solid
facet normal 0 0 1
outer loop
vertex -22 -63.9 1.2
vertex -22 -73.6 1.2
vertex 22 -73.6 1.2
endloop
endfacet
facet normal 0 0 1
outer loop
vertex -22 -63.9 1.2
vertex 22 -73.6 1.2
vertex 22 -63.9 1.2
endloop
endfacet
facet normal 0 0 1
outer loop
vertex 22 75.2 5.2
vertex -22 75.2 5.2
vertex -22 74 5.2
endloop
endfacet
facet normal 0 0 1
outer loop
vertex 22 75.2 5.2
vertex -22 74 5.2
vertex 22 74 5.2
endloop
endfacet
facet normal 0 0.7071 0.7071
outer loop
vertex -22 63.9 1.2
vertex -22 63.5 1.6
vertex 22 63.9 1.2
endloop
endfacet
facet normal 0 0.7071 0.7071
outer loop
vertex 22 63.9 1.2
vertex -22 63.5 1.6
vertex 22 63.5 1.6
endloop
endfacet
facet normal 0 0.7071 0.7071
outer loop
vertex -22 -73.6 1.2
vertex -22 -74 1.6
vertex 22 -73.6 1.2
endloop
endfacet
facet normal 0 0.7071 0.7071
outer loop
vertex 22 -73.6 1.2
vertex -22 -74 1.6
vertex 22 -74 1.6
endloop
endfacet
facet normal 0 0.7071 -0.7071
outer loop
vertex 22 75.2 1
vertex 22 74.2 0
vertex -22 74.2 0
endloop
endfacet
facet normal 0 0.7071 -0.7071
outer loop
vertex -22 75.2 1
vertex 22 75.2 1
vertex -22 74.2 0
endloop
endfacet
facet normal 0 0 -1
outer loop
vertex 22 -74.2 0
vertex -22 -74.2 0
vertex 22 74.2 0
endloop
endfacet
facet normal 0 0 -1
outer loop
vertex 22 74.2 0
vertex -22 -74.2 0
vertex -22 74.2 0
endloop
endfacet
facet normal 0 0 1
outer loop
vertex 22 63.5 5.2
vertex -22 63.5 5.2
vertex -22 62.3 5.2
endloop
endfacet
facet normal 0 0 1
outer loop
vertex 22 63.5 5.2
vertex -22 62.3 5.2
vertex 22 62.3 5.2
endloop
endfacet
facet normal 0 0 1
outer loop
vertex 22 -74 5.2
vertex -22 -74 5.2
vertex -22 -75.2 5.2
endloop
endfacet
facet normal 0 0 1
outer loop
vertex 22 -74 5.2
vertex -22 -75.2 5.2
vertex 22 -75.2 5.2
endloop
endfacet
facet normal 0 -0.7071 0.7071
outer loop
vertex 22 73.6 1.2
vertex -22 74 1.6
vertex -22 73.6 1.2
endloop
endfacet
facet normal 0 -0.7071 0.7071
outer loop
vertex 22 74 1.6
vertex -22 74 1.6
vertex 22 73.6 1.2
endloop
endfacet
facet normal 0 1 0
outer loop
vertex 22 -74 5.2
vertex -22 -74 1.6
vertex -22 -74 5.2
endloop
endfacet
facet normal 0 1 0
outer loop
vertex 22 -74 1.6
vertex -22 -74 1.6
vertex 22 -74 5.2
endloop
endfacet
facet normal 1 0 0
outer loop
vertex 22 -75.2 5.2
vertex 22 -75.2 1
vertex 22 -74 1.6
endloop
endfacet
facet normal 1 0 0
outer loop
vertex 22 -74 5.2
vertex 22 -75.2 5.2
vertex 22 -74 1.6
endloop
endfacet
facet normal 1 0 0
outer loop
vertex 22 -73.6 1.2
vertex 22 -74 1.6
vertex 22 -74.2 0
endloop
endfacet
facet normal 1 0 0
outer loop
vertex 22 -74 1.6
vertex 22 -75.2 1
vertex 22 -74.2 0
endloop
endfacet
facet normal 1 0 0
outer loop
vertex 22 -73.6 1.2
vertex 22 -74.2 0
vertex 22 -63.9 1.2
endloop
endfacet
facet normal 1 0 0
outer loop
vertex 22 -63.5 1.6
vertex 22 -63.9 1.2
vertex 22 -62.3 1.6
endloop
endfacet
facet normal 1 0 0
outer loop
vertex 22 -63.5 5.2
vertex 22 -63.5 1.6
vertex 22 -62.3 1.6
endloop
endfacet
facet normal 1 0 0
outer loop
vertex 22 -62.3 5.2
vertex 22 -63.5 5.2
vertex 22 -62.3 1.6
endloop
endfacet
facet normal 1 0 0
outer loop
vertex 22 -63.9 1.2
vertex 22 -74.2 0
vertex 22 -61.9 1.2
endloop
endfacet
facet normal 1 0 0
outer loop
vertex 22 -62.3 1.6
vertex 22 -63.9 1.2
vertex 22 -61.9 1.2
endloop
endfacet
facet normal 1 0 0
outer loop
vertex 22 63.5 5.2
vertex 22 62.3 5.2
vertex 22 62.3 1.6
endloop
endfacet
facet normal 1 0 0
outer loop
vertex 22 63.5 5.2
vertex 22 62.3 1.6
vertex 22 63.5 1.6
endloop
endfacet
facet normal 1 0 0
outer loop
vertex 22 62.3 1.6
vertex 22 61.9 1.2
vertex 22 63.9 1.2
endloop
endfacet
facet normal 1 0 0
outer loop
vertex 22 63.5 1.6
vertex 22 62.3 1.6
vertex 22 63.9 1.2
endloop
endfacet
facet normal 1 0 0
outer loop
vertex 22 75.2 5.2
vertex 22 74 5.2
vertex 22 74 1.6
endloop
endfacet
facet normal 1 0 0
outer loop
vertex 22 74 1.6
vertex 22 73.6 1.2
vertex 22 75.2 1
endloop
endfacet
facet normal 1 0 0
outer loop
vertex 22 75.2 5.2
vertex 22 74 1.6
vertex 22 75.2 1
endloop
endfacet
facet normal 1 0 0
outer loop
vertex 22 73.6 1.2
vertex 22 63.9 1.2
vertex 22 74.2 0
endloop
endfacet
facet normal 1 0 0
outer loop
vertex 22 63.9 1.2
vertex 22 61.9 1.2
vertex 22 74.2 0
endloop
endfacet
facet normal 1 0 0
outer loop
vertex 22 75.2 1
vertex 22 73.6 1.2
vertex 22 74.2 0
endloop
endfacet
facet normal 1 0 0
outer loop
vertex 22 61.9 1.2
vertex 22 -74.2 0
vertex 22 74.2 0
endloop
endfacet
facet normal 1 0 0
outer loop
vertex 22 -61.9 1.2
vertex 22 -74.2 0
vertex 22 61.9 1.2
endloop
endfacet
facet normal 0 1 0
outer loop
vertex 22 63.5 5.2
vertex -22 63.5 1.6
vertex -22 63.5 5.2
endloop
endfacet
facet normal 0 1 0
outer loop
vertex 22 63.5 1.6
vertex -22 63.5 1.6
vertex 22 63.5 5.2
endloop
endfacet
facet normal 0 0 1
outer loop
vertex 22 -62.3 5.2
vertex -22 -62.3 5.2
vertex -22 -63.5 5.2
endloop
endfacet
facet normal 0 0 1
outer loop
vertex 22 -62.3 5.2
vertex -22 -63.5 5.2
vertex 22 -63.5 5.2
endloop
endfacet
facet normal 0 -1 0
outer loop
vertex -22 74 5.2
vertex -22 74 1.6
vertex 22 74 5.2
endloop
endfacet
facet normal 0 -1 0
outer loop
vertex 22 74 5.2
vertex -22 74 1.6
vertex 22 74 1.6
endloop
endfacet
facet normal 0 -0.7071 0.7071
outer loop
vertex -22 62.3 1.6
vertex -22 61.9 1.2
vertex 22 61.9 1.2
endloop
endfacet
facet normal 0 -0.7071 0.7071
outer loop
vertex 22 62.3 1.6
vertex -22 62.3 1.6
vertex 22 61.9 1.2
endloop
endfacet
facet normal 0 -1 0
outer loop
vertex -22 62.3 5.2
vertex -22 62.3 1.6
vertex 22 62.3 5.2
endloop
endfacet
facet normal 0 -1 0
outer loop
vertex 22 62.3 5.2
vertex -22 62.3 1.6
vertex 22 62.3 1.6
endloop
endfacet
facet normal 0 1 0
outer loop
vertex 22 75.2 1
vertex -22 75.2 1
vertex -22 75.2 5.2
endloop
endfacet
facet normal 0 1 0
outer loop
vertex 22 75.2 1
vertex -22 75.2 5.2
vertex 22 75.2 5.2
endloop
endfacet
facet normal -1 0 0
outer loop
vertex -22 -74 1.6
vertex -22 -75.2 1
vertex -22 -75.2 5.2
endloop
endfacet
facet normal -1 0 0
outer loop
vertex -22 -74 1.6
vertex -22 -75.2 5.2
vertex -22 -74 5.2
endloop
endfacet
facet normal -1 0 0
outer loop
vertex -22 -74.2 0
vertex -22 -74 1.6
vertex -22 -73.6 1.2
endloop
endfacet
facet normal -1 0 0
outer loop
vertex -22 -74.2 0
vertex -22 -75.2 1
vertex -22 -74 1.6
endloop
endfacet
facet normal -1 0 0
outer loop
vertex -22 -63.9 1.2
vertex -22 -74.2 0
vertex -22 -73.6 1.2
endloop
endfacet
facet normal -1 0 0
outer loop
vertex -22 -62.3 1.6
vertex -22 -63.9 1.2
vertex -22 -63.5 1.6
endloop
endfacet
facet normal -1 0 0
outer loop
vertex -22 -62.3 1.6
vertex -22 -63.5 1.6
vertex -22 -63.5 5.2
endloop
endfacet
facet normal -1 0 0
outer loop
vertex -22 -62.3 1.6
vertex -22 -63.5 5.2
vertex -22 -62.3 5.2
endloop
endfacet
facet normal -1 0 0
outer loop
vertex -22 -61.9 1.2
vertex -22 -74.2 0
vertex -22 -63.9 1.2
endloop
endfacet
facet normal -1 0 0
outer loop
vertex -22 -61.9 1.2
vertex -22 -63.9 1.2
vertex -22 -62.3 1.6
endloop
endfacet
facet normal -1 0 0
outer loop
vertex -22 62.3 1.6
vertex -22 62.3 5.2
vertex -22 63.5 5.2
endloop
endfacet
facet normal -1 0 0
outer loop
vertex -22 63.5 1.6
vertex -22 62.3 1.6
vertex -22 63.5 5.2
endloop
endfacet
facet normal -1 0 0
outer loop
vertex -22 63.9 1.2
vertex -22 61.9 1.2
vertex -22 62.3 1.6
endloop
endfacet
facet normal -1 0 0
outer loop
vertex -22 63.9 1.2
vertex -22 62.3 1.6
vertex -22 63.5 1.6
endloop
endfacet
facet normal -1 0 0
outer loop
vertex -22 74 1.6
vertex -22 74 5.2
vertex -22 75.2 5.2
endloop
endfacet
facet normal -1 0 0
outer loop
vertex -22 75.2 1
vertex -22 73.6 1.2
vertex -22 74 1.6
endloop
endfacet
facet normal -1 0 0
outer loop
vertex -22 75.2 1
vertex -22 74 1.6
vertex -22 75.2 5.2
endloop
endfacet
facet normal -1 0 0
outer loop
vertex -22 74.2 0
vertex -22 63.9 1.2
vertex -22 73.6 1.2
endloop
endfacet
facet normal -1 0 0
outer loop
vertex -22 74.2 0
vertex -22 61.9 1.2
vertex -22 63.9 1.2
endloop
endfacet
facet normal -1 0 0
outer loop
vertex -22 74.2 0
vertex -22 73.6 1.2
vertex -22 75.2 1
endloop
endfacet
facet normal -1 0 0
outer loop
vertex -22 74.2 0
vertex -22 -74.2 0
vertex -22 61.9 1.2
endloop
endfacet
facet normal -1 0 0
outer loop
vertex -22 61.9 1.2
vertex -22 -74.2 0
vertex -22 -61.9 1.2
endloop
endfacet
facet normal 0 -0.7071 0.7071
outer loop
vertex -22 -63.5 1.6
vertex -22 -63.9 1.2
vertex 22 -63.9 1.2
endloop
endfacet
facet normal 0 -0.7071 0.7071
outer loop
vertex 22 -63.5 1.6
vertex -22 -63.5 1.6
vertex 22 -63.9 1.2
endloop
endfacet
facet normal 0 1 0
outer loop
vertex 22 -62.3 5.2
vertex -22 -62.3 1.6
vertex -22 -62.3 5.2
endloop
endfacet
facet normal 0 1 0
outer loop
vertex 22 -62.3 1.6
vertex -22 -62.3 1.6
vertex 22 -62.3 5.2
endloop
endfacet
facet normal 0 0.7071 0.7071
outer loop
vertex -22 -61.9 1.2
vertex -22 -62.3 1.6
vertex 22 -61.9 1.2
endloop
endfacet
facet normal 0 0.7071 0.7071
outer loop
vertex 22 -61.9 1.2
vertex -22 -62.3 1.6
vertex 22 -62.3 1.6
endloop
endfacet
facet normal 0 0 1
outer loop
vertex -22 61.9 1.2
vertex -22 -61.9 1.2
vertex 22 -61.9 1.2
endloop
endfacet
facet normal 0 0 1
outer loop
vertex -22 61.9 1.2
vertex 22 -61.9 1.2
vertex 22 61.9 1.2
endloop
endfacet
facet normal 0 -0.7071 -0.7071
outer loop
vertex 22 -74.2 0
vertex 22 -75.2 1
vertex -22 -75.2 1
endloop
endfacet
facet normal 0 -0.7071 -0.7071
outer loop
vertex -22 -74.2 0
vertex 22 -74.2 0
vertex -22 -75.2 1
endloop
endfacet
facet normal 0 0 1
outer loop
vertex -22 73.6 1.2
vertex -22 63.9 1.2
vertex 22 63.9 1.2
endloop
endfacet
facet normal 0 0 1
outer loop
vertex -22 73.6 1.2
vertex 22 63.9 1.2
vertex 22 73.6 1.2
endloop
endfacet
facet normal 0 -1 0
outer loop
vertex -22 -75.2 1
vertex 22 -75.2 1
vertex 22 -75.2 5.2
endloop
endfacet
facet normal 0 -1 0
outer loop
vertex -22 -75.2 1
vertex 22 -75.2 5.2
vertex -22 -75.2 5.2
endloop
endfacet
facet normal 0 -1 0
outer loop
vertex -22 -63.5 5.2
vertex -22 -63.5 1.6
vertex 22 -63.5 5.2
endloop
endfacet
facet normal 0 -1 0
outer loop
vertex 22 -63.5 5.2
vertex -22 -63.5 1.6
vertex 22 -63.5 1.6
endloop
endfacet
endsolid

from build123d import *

# Parameters (mm, degrees)
CROQUIS1_W              = 150.4
CROQUIS1_H              = 44
SALIENTE_EXTRUIR1_DEPTH = 1.2
CROQUIS2_W              = 44
CROQUIS2_H              = 1.2
SALIENTE_EXTRUIR2_DEPTH = 4
CHAFL_N1_SIZE           = 0.4
CHAFL_N2_SIZE           = 1


with BuildPart() as part:
    # Croquis1 → Saliente-Extruir1 (new body)
    with BuildSketch(Plane(origin=(0, 0, 0), x_dir=(0, 1, 0), z_dir=(0, 0, 1))):
        Rectangle(CROQUIS1_W, CROQUIS1_H)
    extrude(amount=SALIENTE_EXTRUIR1_DEPTH)

    # Croquis2 → Saliente-Extruir2 (add)
    with BuildSketch(Plane.XY.offset(1.2)):
        with Locations((0, 74.6)):
            Rectangle(CROQUIS2_W, CROQUIS2_H)
        with Locations((0, -74.6)):
            Rectangle(CROQUIS2_W, CROQUIS2_H)
        with Locations((0, -62.9)):
            Rectangle(CROQUIS2_W, CROQUIS2_H)
        with Locations((0, 62.9)):
            Rectangle(CROQUIS2_W, CROQUIS2_H)
    extrude(amount=SALIENTE_EXTRUIR2_DEPTH)

    # Chaflán1
    chafl_n1_edges = [part.edges().sort_by_distance(p)[0] for p in [
        (0, 74, 1.2),
        (0, -74, 1.2),
        (0, -63.5, 1.2),
        (0, -62.3, 1.2),
        (0, 62.3, 1.2),
        (0, 63.5, 1.2),
    ]]
    chamfer(chafl_n1_edges, length=CHAFL_N1_SIZE)

    # Chaflán2
    chafl_n2_edges = [part.edges().sort_by_distance(p)[0] for p in [
        (0, -75.2, 0),
        (0, 75.2, 0),
    ]]
    chamfer(chafl_n2_edges, length=CHAFL_N2_SIZE)


solid = part.part
